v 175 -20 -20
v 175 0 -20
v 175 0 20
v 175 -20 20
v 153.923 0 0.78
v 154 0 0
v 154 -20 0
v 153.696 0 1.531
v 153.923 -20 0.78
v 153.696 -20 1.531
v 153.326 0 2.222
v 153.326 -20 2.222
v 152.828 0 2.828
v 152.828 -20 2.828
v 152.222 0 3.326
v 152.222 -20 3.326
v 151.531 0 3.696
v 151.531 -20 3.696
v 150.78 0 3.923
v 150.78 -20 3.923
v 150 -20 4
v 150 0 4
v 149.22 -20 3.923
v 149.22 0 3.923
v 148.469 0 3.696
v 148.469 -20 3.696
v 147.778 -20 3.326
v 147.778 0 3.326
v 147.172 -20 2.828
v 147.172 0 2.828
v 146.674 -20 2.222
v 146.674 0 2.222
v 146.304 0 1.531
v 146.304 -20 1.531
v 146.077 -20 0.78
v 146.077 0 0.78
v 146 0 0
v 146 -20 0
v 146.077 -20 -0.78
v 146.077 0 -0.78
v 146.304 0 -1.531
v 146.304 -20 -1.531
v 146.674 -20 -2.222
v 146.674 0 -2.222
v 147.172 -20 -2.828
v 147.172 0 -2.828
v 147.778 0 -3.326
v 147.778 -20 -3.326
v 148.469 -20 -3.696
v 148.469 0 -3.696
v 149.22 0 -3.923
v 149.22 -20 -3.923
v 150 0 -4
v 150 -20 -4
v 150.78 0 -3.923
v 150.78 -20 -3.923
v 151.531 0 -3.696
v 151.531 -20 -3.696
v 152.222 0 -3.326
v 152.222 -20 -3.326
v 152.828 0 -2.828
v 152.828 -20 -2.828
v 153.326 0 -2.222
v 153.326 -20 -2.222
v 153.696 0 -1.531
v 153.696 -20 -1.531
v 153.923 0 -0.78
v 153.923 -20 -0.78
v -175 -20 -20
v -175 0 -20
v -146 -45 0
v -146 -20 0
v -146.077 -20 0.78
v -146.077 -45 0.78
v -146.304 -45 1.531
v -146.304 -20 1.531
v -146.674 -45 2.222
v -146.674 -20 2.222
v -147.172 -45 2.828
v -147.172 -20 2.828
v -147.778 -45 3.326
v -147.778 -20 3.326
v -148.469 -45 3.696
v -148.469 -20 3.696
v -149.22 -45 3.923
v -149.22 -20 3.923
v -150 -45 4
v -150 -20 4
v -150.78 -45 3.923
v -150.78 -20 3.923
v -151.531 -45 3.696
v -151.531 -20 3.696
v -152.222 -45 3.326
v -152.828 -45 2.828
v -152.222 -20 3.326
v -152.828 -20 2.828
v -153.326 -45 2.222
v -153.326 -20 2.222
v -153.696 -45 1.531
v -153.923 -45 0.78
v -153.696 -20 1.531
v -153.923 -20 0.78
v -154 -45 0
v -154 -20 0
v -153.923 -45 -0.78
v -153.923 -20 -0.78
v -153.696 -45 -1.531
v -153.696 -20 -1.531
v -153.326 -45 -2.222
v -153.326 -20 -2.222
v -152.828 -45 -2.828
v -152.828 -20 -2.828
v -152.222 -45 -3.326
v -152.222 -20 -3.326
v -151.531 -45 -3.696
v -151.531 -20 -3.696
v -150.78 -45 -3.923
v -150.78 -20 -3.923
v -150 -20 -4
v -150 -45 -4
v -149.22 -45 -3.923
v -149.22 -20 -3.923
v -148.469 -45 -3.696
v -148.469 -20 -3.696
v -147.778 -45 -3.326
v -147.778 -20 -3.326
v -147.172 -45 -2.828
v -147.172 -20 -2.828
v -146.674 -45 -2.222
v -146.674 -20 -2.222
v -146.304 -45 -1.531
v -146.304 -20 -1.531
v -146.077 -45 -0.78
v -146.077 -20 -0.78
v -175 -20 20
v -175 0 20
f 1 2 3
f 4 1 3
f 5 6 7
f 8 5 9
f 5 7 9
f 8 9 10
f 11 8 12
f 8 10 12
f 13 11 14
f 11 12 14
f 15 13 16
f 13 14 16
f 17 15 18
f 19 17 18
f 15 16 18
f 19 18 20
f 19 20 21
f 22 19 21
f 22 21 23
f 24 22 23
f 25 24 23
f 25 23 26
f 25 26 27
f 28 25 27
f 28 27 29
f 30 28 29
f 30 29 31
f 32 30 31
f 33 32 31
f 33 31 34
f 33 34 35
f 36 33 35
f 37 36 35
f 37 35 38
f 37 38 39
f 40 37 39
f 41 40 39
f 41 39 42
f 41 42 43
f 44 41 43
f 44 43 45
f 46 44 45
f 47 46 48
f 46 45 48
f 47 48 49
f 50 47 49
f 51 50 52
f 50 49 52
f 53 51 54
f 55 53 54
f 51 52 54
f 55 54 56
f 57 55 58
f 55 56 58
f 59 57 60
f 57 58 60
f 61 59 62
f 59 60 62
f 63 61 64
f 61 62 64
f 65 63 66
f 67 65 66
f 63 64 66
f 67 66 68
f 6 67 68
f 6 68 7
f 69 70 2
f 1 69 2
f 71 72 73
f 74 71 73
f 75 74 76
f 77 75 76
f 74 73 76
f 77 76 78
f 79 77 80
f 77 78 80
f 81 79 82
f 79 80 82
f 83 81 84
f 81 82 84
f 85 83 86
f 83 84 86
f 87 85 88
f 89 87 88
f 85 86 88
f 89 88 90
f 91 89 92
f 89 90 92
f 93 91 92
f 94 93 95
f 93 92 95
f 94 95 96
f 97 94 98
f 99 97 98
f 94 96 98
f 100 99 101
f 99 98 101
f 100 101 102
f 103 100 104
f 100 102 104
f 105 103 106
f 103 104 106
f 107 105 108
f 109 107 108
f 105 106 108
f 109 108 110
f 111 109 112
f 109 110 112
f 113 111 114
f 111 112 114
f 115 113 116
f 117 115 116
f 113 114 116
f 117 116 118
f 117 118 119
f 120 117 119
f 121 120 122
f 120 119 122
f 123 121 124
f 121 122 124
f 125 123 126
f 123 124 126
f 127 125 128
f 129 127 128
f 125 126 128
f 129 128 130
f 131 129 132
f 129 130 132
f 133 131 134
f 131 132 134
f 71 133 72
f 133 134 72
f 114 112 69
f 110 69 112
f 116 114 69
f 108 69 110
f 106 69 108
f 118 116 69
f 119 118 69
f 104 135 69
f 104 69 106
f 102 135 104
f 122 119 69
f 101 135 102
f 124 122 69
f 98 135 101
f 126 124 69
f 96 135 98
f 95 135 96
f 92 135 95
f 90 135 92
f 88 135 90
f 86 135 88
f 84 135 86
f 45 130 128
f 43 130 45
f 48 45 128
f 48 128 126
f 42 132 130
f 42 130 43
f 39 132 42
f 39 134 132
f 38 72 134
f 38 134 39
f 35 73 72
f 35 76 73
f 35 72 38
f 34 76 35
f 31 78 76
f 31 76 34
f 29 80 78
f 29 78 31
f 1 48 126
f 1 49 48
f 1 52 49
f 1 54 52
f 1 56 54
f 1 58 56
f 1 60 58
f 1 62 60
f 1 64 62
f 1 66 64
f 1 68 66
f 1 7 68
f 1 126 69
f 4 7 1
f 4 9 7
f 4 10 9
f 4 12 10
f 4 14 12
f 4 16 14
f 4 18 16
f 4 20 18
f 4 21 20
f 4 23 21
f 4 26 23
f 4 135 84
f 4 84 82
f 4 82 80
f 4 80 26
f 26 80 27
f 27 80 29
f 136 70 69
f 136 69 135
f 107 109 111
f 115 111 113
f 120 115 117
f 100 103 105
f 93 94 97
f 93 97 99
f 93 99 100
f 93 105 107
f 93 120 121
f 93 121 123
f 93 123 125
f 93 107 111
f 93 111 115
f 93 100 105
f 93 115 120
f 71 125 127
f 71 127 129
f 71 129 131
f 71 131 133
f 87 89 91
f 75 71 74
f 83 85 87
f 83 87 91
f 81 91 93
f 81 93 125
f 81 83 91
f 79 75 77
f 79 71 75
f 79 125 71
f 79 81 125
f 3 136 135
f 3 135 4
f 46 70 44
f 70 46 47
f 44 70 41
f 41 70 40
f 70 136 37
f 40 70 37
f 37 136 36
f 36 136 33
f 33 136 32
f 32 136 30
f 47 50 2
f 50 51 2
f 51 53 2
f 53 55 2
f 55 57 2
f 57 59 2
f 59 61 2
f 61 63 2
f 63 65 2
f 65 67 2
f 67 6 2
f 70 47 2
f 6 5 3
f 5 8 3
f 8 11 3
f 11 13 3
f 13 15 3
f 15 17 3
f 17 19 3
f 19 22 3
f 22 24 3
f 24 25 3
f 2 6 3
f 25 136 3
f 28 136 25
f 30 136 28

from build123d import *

# Parameters (mm, degrees)
F0_W     = 350
F0_H     = 40
F1_DEPTH = 20
F2_R     = 4
F3_DEPTH = 25
F4_R     = 4
F5_DEPTH = 25


with BuildPart() as f1:
    # F0 (on Front) → F1 (new body)
    with BuildSketch(Plane.XZ):
        Rectangle(F0_W, F0_H)
    extrude(amount=F1_DEPTH)

    # F2 (on face) → F3 (join)
    with BuildSketch(Plane.XZ.offset(20)):
        with Locations((-150, 0)):
            Circle(F2_R)
    extrude(amount=F3_DEPTH)

    # F4 (on face) → F5 (cut)
    with BuildSketch(Plane.XZ.offset(20)):
        with Locations((150, 0)):
            Circle(F4_R)
    extrude(amount=-F5_DEPTH, mode=Mode.SUBTRACT)


solid = f1.part
